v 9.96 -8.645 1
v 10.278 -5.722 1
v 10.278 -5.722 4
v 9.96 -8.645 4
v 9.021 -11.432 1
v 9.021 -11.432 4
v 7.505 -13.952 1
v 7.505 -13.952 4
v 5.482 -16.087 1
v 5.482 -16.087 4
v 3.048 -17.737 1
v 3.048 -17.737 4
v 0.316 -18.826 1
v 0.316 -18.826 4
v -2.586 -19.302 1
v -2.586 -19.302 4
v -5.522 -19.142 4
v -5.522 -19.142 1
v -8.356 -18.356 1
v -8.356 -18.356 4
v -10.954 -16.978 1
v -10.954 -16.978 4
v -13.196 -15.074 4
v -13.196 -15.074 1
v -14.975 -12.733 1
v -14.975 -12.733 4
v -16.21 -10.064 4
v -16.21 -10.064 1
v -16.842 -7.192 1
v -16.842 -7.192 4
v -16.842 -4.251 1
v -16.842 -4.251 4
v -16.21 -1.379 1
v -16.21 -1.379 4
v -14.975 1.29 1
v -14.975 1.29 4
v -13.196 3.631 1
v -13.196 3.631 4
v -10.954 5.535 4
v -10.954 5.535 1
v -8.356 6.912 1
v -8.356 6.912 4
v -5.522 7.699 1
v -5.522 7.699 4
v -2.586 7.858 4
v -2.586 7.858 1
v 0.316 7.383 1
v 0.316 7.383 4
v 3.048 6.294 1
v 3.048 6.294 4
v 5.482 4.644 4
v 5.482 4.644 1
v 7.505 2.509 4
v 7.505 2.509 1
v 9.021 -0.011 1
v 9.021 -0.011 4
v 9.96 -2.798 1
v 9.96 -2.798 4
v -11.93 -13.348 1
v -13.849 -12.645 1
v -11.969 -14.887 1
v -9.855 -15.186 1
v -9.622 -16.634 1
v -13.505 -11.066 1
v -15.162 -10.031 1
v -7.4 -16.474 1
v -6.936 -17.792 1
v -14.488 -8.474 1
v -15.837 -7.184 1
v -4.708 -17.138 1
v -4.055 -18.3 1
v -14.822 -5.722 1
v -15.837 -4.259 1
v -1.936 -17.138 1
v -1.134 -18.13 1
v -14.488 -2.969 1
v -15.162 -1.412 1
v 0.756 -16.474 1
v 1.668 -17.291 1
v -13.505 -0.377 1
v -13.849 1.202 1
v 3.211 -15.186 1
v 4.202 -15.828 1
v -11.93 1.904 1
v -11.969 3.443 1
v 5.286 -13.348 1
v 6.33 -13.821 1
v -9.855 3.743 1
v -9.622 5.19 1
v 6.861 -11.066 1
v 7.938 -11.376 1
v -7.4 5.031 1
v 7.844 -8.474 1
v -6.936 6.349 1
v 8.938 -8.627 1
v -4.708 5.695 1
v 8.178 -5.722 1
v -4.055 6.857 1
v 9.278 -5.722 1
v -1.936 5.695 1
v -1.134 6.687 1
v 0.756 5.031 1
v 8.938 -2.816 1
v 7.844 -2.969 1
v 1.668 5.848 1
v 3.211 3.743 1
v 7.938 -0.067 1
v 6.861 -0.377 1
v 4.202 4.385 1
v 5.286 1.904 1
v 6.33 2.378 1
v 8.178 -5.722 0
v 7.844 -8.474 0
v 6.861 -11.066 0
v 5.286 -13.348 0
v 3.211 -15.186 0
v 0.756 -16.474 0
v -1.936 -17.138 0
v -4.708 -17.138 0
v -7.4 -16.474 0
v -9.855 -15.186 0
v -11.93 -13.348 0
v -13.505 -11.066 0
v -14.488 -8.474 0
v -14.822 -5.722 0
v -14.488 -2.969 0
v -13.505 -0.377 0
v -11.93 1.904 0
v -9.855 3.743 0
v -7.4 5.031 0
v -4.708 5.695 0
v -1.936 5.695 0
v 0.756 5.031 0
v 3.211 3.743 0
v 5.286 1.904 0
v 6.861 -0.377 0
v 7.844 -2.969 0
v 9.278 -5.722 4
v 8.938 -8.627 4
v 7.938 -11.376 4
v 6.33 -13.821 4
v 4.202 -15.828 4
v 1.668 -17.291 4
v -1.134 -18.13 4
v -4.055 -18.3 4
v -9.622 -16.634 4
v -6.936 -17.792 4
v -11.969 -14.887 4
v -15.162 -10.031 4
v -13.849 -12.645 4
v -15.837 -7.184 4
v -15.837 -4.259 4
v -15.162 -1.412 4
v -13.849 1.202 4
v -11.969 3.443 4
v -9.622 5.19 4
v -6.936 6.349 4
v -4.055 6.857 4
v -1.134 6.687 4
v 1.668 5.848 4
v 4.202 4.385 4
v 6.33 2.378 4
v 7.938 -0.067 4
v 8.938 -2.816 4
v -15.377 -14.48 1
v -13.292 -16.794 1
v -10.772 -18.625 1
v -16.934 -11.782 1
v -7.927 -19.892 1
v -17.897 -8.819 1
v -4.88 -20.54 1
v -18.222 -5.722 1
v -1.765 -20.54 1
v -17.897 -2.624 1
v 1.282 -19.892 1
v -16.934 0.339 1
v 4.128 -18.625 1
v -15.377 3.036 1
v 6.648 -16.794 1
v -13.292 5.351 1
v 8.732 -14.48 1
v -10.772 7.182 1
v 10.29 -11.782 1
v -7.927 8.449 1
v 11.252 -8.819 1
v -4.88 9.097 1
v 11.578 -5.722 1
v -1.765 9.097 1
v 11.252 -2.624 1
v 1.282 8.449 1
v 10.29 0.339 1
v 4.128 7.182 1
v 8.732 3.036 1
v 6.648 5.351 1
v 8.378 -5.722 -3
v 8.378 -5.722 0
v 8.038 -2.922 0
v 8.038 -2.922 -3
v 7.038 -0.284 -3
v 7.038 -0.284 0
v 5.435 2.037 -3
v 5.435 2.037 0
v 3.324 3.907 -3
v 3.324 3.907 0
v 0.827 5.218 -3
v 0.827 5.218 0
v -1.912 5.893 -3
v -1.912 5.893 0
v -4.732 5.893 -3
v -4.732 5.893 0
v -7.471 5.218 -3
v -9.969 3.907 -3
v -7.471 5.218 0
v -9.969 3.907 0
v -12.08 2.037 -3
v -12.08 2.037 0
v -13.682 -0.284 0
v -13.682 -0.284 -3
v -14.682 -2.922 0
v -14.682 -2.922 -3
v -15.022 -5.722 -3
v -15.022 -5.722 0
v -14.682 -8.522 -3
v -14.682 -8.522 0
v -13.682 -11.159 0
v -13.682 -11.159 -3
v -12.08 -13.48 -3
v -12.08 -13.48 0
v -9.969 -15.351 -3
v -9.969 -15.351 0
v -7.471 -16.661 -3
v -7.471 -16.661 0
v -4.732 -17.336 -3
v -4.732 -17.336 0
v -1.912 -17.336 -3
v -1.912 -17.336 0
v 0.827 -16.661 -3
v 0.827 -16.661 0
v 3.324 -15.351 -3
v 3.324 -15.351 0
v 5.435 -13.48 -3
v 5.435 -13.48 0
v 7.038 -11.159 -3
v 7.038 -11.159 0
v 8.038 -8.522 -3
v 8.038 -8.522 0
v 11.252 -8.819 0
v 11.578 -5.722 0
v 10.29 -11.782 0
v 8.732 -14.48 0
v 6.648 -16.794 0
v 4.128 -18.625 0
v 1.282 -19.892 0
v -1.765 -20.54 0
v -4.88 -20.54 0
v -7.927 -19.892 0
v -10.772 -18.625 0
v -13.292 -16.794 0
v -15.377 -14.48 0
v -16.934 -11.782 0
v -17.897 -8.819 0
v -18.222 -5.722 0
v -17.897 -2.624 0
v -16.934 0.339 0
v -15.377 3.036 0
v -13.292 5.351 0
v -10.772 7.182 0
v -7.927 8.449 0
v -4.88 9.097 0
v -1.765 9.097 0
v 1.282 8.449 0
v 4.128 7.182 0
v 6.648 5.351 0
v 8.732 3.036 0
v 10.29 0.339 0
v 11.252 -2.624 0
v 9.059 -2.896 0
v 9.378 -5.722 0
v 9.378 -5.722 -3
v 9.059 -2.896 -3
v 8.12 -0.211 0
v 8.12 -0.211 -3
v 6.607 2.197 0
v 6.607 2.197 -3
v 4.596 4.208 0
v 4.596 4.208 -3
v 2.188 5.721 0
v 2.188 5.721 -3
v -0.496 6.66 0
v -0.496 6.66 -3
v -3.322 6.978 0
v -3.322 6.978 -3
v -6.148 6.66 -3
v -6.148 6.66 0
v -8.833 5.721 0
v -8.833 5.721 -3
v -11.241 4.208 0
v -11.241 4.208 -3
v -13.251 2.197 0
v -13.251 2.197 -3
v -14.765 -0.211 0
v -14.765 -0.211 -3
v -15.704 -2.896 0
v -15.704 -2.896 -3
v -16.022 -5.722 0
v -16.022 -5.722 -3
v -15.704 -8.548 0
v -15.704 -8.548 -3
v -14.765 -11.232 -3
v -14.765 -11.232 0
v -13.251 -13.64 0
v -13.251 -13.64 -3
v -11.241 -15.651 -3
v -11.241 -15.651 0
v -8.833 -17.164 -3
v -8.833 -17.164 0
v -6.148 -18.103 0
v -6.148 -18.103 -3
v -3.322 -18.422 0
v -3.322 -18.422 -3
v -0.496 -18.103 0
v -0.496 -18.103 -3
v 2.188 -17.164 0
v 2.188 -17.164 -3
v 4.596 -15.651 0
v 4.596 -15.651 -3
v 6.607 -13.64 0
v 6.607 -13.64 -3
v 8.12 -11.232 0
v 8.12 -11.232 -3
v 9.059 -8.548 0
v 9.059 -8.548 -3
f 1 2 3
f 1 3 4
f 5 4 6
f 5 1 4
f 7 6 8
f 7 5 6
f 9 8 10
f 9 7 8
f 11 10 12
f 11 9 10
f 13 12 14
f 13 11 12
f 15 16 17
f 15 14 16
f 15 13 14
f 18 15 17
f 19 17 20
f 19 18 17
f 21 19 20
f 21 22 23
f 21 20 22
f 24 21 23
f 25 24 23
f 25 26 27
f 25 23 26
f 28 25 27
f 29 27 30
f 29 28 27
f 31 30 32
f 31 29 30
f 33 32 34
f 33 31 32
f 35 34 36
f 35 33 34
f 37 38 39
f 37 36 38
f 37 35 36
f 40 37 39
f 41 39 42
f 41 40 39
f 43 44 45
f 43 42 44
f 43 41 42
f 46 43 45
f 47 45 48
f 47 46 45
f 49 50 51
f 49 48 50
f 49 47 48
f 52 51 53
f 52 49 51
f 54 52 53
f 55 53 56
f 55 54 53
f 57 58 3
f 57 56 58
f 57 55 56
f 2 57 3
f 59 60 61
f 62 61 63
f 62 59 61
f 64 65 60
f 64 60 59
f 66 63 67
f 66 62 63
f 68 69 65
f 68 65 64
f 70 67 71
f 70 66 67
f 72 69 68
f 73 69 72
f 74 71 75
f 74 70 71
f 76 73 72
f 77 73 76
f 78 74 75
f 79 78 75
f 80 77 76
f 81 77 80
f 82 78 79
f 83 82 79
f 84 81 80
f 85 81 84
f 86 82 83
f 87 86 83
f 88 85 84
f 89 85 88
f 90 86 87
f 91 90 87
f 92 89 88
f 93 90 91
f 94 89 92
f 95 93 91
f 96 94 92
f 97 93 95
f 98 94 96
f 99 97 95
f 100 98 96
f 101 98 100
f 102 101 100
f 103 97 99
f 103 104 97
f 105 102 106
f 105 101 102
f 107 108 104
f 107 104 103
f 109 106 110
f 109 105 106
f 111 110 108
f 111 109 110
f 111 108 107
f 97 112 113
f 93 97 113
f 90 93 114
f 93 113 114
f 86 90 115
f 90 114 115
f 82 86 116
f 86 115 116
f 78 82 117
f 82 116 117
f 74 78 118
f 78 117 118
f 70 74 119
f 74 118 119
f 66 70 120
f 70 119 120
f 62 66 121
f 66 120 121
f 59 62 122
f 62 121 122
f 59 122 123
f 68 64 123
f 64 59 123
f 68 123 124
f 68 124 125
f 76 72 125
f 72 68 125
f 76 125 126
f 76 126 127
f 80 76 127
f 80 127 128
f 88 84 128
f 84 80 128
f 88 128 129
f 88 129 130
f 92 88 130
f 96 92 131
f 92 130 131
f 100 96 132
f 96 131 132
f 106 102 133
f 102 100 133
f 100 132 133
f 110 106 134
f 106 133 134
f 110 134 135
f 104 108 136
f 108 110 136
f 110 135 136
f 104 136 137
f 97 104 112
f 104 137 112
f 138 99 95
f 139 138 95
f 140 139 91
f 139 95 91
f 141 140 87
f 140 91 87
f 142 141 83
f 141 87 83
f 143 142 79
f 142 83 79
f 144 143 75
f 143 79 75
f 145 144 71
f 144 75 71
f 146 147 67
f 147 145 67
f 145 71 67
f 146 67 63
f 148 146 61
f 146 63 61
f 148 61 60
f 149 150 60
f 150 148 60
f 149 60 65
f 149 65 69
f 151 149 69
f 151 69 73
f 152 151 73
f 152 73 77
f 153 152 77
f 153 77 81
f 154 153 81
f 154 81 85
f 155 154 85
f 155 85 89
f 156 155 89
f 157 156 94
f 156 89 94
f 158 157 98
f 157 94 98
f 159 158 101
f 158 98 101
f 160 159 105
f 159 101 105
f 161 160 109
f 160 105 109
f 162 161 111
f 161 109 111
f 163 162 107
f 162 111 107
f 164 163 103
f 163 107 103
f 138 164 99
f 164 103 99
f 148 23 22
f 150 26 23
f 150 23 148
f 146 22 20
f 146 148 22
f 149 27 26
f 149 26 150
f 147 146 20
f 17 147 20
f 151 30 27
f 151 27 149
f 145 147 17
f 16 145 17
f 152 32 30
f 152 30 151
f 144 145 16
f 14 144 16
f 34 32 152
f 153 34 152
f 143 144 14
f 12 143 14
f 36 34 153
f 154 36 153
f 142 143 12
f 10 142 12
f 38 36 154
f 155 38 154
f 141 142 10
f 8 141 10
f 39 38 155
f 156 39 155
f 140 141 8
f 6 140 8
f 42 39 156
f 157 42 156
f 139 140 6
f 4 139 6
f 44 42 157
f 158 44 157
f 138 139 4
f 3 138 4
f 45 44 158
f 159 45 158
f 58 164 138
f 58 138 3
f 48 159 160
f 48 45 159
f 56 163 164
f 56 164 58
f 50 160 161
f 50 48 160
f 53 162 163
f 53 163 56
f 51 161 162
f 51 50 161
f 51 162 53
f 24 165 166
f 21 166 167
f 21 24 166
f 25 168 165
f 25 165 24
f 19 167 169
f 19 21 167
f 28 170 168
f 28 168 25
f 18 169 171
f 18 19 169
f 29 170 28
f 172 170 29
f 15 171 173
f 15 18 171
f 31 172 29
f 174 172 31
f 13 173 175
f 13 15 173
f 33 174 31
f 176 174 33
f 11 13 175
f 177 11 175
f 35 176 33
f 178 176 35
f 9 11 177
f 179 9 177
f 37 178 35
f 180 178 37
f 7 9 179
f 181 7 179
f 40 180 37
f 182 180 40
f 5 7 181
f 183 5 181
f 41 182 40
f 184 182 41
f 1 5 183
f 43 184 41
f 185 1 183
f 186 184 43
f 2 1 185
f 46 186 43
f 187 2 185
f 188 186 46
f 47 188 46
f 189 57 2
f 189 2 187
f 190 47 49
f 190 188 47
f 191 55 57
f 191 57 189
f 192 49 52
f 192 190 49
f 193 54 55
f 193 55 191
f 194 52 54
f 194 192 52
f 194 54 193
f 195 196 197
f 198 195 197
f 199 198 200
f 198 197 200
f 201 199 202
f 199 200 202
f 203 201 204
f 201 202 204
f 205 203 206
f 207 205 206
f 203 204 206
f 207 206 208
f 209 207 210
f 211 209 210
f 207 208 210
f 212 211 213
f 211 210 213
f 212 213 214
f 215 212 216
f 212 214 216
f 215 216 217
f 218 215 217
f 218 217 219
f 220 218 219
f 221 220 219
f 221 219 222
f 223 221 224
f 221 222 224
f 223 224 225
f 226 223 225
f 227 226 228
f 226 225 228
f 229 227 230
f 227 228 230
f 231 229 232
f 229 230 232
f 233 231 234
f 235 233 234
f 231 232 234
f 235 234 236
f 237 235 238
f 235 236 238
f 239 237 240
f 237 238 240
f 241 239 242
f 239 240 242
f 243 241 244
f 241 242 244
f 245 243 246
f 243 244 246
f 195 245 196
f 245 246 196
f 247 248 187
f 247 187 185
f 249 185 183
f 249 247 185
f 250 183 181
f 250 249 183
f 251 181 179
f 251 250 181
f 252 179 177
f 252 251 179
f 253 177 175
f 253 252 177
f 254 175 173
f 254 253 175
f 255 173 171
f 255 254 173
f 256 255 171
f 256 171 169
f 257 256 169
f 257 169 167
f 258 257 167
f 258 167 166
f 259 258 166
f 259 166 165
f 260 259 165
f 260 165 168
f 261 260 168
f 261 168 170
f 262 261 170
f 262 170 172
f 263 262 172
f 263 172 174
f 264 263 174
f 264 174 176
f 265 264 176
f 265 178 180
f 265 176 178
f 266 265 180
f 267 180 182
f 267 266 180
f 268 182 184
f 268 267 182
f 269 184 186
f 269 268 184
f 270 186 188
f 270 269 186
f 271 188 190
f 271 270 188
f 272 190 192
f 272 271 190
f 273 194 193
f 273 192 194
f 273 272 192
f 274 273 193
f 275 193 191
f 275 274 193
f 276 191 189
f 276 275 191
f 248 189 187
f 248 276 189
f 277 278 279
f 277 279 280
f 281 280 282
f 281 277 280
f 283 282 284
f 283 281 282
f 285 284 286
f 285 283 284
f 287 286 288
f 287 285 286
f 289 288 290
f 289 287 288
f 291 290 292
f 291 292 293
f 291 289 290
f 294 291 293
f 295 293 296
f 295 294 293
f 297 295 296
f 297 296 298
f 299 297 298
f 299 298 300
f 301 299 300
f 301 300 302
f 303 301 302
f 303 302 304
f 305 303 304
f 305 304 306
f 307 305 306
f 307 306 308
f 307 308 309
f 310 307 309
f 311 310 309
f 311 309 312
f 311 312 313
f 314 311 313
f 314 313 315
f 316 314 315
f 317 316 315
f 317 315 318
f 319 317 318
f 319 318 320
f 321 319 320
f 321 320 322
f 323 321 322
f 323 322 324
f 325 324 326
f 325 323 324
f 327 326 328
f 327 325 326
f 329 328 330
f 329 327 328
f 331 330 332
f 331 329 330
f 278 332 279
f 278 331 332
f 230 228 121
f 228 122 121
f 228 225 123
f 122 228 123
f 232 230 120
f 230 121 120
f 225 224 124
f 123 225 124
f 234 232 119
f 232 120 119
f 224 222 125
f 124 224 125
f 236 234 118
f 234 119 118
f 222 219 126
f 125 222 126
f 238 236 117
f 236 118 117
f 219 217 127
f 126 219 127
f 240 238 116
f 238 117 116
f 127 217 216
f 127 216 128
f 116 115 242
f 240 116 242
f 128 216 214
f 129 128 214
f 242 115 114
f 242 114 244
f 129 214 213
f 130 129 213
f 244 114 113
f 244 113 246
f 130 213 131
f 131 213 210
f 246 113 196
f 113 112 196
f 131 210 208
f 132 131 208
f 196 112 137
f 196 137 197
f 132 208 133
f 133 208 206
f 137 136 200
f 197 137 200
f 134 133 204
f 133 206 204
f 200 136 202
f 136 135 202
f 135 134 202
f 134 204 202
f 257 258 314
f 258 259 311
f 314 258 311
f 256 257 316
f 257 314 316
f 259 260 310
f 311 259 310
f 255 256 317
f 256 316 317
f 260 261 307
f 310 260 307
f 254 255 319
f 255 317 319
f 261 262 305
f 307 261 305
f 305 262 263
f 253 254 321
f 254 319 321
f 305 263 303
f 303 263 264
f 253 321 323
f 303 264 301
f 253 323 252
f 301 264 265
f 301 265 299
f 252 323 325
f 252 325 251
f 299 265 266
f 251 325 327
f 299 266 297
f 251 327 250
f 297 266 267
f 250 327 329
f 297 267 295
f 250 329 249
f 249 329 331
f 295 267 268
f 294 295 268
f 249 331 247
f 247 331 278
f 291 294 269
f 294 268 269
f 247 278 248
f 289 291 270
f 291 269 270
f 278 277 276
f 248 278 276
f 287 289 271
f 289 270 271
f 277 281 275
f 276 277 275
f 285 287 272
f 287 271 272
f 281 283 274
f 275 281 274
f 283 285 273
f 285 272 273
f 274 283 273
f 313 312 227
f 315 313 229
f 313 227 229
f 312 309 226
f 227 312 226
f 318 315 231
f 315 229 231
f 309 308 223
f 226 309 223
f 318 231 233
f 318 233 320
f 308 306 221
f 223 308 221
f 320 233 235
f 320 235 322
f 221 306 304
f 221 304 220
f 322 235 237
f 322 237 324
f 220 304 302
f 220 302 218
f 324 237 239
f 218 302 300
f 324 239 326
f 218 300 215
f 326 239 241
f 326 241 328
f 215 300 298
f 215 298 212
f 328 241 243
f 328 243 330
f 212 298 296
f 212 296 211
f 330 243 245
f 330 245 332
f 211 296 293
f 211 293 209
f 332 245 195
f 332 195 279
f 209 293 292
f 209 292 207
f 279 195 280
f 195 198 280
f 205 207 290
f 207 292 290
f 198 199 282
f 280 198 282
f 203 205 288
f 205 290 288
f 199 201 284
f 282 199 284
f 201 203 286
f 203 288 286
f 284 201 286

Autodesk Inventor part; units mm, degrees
ref_plane "YZ Plane" through (0, 0, 0) normal (1, 0, 0) x (0, 1, 0)
ref_plane "XZ Plane" through (0, 0, 0) normal (0, 1, 0) x (-1, 0, 0)
ref_plane "XY Plane" through (0, 0, 0) normal (0, 0, 1) x (1, 0, 0)
sketch "Sketch1" plane through (0, 0, 0) normal (0, 0, 1) x (1, 0, 0)
  circle A0 centre (-3.3222, -5.7216) radius 11.7
  circle A1 centre (-3.3222, -5.7216) radius 12.7
  point P0 (0, 0)
  dimension "d3" = 1
  dimension "d4" = 25.4
extrude "Extrusion1" add sketch "Sketch1" against normal blind 3
sketch "Sketch3" plane through (-3.3222, -5.7216, 0) normal (0, 0, 1) x (1, 0, 0)
  circle A0 centre (0, 0) radius 11.7 projected
  circle A1 centre (0, 0) radius 12.7 projected
  circle A2 centre (0, 0) radius 11.5
  circle A3 centre (0, 0) radius 14.9
  point P0 (3.3222, 5.7216)
  dimension "d12" = 23
  dimension "d14" = 29.8
extrude "Extrusion3" add sketch "Sketch3" along normal blind 1 contours A0 | A1 | A3
sketch "Sketch4" plane through (-3.3222, -5.7216, 1) normal (0, 0, 1) x (1, 0, 0)
  circle A0 centre (0, 0) radius 14.9 projected
  circle A1 centre (0, 0) radius 12.6
  circle A2 centre (0, 0) radius 13.6
  point P0 (3.3222, 5.7216)
  dimension "d17" = 1
  dimension "d19" = 25.2
extrude "Extrusion4" add sketch "Sketch4" along normal blind 3 contours A2
properties part number "Eyepiece tube filter holder"
